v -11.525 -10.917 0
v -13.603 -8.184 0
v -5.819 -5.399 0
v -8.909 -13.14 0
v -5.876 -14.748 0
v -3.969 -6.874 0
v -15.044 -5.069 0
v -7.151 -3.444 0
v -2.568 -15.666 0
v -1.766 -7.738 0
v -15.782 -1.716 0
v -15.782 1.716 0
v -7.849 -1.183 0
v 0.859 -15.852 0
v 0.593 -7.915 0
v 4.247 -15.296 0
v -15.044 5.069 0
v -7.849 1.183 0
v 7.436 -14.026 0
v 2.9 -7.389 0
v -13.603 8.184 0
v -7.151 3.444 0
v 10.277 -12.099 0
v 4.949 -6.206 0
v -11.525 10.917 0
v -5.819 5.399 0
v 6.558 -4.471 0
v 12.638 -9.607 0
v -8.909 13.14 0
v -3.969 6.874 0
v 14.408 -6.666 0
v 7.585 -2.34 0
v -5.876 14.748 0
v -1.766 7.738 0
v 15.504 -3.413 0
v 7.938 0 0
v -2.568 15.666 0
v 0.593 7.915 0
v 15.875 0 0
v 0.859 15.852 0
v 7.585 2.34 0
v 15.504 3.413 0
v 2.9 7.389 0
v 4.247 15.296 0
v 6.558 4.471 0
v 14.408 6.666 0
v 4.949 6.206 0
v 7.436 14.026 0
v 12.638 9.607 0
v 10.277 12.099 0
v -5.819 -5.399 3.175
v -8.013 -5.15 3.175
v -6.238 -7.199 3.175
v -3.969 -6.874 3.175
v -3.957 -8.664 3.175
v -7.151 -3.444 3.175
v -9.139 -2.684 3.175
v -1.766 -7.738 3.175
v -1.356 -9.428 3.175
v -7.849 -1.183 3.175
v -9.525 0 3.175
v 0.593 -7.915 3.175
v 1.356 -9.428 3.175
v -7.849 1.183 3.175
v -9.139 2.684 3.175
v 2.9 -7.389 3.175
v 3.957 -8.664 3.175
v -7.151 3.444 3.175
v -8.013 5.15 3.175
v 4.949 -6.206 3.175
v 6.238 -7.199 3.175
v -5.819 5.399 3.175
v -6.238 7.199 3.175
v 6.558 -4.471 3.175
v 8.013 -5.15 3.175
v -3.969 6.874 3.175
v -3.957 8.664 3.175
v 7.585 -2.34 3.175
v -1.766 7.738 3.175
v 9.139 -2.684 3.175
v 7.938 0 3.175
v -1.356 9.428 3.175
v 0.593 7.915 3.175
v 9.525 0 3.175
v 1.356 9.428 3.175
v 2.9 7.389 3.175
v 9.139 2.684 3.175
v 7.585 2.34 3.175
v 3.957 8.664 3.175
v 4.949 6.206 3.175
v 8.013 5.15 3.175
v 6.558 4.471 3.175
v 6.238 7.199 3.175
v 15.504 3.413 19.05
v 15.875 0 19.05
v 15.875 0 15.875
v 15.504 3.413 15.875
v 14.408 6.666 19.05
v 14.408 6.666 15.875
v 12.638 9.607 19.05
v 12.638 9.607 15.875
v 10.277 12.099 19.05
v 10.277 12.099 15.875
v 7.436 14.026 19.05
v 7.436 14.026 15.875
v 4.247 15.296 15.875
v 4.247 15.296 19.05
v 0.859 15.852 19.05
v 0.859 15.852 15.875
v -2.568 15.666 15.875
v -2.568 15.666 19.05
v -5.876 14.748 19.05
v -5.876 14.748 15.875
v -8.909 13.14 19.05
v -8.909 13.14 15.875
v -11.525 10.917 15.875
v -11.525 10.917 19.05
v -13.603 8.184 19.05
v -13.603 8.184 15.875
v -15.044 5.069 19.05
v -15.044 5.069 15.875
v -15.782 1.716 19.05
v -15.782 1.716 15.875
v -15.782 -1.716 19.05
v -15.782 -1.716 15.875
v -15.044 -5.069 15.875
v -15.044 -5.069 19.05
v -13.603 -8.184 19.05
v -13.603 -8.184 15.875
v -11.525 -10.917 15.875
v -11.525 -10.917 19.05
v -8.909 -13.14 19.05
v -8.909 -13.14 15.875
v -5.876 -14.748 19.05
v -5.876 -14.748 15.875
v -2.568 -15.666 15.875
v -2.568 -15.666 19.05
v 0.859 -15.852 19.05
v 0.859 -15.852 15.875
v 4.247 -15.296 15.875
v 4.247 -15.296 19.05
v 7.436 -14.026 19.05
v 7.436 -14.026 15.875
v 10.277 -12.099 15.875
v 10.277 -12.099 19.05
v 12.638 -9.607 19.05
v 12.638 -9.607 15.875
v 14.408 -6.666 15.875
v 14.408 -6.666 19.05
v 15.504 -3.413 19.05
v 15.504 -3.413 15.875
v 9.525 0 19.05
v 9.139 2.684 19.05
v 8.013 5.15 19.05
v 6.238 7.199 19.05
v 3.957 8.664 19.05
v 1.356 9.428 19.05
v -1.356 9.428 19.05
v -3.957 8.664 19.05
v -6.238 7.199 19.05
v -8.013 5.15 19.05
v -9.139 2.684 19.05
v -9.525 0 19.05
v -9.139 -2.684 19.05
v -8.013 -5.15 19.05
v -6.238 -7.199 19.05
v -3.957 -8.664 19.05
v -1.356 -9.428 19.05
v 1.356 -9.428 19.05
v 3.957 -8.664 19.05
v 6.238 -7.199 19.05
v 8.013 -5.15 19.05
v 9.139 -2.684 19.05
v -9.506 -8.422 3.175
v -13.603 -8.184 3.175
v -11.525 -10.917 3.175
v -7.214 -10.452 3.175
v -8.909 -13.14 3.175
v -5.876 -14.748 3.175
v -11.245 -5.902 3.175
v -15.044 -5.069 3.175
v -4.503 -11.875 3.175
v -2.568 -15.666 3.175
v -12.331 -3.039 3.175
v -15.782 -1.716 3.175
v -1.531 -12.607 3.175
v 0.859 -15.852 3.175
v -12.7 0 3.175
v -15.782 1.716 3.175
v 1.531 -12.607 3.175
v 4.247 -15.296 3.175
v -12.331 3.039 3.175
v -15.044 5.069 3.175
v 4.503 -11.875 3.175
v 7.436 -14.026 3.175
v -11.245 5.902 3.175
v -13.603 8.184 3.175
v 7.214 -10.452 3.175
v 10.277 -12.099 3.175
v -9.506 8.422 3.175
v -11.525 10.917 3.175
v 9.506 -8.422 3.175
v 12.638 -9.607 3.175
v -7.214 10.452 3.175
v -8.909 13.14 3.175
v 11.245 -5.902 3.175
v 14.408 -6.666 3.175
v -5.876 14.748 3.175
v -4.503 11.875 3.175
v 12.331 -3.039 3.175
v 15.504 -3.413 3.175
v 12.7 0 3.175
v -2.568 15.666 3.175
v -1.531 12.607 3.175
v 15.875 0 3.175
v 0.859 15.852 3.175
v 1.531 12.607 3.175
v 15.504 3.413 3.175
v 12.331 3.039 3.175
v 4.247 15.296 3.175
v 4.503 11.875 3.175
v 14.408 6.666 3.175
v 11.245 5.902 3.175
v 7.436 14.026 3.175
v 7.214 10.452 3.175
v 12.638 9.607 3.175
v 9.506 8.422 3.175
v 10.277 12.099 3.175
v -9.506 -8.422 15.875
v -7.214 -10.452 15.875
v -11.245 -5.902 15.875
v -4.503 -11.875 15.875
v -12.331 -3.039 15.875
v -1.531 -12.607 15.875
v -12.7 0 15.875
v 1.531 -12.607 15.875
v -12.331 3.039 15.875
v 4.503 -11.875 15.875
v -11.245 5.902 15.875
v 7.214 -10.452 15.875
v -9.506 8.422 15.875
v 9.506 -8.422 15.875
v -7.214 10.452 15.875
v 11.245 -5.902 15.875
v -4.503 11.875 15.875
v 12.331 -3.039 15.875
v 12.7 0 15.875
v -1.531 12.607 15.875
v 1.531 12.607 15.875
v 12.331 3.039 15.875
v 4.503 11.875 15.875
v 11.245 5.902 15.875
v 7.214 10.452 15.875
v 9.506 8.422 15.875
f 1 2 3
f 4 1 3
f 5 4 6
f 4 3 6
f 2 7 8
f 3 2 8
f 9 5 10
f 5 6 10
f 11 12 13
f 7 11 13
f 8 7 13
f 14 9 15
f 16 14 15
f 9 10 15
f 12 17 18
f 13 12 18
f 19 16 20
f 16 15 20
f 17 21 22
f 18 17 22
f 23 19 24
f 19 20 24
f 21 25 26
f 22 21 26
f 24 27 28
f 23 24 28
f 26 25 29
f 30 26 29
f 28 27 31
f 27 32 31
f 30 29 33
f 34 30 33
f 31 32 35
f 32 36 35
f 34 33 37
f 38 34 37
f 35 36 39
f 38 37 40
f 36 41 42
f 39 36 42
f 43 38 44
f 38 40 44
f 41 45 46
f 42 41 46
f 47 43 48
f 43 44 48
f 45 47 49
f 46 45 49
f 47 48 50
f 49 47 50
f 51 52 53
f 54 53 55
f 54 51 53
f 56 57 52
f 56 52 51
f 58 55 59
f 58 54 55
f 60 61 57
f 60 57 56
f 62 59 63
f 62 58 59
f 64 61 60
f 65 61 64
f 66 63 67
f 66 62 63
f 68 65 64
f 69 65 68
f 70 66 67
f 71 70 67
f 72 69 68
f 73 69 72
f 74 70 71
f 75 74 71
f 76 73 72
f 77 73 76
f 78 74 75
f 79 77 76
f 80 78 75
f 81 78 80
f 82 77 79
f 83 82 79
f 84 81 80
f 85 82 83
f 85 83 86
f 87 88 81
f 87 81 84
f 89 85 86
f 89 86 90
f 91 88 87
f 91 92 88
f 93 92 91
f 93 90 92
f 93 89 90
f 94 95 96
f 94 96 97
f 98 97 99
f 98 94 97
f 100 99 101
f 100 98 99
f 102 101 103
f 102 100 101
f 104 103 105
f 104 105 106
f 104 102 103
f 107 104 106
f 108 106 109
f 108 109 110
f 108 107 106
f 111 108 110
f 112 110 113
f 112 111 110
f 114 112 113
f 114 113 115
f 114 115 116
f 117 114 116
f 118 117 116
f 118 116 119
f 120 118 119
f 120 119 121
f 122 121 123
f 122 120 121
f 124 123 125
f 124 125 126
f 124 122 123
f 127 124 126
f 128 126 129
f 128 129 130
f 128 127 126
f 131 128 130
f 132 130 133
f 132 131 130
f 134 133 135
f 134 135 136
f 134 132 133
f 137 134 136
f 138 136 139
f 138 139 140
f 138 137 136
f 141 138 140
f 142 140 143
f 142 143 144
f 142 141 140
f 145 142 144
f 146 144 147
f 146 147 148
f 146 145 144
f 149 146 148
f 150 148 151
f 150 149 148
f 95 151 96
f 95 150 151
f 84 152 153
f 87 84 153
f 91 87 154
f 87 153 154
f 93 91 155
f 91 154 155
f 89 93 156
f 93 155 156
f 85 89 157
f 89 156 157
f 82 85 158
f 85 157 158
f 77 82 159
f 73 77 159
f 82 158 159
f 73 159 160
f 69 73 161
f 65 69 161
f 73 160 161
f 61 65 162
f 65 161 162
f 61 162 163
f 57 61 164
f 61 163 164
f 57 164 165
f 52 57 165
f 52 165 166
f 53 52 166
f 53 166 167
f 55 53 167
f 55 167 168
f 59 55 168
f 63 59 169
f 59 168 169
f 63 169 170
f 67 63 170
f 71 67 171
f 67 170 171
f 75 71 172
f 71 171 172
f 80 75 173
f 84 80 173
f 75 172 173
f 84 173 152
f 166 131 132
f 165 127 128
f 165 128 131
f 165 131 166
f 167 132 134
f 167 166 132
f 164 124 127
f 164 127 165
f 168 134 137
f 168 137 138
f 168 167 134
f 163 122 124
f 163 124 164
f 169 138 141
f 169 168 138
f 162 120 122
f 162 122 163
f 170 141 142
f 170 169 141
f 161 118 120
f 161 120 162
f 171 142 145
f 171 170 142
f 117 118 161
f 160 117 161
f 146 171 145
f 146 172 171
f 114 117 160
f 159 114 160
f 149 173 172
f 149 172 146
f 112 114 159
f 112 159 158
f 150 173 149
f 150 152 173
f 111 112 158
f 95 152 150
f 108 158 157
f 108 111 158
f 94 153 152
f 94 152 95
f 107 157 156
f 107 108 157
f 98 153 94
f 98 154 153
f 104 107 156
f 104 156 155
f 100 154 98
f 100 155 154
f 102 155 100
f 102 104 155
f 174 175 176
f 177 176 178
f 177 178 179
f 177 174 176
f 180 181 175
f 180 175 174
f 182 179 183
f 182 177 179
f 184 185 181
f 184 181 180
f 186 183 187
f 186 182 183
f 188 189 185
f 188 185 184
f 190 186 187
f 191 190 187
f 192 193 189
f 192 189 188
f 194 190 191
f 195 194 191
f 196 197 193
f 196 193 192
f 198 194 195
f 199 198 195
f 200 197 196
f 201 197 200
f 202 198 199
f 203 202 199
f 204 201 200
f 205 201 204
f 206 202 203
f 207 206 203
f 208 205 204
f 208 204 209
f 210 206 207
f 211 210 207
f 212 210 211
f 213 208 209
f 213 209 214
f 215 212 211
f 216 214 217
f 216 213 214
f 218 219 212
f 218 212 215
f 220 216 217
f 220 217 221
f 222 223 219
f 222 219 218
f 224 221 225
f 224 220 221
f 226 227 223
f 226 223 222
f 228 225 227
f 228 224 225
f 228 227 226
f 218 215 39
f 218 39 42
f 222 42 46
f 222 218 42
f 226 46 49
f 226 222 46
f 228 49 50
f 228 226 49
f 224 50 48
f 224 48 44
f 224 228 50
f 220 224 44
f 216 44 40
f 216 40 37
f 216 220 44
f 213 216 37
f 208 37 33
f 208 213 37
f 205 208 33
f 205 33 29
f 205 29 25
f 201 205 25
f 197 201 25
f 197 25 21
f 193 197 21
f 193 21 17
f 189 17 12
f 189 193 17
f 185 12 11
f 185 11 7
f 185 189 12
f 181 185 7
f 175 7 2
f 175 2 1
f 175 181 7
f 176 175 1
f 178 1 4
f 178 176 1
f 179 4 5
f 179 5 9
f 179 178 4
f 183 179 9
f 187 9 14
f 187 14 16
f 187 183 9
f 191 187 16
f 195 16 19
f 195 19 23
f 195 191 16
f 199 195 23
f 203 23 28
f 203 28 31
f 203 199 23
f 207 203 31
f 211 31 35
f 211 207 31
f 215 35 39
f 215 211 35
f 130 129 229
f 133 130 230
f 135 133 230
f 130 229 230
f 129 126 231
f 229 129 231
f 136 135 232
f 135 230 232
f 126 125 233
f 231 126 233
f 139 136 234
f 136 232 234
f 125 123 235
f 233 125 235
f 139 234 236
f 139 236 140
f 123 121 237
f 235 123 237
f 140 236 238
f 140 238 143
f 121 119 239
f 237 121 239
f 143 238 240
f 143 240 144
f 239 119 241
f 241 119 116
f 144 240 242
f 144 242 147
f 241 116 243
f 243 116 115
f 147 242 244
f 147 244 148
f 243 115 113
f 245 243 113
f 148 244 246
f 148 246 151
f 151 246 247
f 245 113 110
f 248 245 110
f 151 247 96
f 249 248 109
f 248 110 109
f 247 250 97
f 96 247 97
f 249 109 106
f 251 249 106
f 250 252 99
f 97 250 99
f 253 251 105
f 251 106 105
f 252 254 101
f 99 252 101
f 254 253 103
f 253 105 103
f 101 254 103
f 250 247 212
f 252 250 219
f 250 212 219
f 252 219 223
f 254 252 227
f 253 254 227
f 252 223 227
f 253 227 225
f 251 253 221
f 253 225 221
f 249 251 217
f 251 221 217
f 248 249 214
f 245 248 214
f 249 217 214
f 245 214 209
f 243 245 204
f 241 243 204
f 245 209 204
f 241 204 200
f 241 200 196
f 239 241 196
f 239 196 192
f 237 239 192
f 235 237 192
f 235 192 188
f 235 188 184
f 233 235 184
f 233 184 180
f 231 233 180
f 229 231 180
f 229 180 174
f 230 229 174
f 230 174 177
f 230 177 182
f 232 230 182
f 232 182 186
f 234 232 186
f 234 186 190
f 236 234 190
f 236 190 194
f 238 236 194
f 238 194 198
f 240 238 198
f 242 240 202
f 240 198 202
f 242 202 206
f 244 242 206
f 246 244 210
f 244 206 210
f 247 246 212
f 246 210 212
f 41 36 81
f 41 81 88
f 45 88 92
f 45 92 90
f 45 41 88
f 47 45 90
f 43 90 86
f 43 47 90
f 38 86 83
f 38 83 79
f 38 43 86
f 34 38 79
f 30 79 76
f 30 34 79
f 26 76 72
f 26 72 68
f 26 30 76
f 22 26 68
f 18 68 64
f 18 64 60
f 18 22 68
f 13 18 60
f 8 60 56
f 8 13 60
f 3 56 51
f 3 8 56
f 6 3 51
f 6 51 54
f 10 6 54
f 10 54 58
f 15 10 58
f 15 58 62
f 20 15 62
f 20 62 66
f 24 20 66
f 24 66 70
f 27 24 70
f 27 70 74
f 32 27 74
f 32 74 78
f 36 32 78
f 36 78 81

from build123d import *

# Parameters (mm, degrees)
F0_R     = 12.7
F0_R_2   = 7.9375
F1_DEPTH = 19.05
F2_R     = 9.525
F2_R_2   = 7.9375
F3_DEPTH = 15.875
F4_R     = 15.875
F4_R_2   = 12.7
F5_DEPTH = 3.175
F6_R     = 15.875
F6_R_2   = 12.7
F7_DEPTH = 3.175


with BuildPart() as f1:
    # F0 (on Top) → F1 (new body)
    with BuildSketch(Plane.XY):
        Circle(F0_R)
        Circle(F0_R_2, mode=Mode.SUBTRACT)
    extrude(amount=F1_DEPTH)

    # F2 (on face) → F3 (cut)
    with BuildSketch(Plane.XY.offset(19.05)):
        Circle(F2_R)
        Circle(F2_R_2, mode=Mode.SUBTRACT)
    extrude(amount=-F3_DEPTH, mode=Mode.SUBTRACT)

    # F4 (on face) → F5 (join)
    with BuildSketch(Plane.XY.offset(3.175)):
        Circle(F4_R)
        Circle(F4_R_2, mode=Mode.SUBTRACT)
    extrude(amount=-F5_DEPTH)

    # F6 (on face) → F7 (join)
    with BuildSketch(Plane.XY.offset(19.05)):
        Circle(F6_R)
        Circle(F6_R_2, mode=Mode.SUBTRACT)
    extrude(amount=-F7_DEPTH)


solid = f1.part
